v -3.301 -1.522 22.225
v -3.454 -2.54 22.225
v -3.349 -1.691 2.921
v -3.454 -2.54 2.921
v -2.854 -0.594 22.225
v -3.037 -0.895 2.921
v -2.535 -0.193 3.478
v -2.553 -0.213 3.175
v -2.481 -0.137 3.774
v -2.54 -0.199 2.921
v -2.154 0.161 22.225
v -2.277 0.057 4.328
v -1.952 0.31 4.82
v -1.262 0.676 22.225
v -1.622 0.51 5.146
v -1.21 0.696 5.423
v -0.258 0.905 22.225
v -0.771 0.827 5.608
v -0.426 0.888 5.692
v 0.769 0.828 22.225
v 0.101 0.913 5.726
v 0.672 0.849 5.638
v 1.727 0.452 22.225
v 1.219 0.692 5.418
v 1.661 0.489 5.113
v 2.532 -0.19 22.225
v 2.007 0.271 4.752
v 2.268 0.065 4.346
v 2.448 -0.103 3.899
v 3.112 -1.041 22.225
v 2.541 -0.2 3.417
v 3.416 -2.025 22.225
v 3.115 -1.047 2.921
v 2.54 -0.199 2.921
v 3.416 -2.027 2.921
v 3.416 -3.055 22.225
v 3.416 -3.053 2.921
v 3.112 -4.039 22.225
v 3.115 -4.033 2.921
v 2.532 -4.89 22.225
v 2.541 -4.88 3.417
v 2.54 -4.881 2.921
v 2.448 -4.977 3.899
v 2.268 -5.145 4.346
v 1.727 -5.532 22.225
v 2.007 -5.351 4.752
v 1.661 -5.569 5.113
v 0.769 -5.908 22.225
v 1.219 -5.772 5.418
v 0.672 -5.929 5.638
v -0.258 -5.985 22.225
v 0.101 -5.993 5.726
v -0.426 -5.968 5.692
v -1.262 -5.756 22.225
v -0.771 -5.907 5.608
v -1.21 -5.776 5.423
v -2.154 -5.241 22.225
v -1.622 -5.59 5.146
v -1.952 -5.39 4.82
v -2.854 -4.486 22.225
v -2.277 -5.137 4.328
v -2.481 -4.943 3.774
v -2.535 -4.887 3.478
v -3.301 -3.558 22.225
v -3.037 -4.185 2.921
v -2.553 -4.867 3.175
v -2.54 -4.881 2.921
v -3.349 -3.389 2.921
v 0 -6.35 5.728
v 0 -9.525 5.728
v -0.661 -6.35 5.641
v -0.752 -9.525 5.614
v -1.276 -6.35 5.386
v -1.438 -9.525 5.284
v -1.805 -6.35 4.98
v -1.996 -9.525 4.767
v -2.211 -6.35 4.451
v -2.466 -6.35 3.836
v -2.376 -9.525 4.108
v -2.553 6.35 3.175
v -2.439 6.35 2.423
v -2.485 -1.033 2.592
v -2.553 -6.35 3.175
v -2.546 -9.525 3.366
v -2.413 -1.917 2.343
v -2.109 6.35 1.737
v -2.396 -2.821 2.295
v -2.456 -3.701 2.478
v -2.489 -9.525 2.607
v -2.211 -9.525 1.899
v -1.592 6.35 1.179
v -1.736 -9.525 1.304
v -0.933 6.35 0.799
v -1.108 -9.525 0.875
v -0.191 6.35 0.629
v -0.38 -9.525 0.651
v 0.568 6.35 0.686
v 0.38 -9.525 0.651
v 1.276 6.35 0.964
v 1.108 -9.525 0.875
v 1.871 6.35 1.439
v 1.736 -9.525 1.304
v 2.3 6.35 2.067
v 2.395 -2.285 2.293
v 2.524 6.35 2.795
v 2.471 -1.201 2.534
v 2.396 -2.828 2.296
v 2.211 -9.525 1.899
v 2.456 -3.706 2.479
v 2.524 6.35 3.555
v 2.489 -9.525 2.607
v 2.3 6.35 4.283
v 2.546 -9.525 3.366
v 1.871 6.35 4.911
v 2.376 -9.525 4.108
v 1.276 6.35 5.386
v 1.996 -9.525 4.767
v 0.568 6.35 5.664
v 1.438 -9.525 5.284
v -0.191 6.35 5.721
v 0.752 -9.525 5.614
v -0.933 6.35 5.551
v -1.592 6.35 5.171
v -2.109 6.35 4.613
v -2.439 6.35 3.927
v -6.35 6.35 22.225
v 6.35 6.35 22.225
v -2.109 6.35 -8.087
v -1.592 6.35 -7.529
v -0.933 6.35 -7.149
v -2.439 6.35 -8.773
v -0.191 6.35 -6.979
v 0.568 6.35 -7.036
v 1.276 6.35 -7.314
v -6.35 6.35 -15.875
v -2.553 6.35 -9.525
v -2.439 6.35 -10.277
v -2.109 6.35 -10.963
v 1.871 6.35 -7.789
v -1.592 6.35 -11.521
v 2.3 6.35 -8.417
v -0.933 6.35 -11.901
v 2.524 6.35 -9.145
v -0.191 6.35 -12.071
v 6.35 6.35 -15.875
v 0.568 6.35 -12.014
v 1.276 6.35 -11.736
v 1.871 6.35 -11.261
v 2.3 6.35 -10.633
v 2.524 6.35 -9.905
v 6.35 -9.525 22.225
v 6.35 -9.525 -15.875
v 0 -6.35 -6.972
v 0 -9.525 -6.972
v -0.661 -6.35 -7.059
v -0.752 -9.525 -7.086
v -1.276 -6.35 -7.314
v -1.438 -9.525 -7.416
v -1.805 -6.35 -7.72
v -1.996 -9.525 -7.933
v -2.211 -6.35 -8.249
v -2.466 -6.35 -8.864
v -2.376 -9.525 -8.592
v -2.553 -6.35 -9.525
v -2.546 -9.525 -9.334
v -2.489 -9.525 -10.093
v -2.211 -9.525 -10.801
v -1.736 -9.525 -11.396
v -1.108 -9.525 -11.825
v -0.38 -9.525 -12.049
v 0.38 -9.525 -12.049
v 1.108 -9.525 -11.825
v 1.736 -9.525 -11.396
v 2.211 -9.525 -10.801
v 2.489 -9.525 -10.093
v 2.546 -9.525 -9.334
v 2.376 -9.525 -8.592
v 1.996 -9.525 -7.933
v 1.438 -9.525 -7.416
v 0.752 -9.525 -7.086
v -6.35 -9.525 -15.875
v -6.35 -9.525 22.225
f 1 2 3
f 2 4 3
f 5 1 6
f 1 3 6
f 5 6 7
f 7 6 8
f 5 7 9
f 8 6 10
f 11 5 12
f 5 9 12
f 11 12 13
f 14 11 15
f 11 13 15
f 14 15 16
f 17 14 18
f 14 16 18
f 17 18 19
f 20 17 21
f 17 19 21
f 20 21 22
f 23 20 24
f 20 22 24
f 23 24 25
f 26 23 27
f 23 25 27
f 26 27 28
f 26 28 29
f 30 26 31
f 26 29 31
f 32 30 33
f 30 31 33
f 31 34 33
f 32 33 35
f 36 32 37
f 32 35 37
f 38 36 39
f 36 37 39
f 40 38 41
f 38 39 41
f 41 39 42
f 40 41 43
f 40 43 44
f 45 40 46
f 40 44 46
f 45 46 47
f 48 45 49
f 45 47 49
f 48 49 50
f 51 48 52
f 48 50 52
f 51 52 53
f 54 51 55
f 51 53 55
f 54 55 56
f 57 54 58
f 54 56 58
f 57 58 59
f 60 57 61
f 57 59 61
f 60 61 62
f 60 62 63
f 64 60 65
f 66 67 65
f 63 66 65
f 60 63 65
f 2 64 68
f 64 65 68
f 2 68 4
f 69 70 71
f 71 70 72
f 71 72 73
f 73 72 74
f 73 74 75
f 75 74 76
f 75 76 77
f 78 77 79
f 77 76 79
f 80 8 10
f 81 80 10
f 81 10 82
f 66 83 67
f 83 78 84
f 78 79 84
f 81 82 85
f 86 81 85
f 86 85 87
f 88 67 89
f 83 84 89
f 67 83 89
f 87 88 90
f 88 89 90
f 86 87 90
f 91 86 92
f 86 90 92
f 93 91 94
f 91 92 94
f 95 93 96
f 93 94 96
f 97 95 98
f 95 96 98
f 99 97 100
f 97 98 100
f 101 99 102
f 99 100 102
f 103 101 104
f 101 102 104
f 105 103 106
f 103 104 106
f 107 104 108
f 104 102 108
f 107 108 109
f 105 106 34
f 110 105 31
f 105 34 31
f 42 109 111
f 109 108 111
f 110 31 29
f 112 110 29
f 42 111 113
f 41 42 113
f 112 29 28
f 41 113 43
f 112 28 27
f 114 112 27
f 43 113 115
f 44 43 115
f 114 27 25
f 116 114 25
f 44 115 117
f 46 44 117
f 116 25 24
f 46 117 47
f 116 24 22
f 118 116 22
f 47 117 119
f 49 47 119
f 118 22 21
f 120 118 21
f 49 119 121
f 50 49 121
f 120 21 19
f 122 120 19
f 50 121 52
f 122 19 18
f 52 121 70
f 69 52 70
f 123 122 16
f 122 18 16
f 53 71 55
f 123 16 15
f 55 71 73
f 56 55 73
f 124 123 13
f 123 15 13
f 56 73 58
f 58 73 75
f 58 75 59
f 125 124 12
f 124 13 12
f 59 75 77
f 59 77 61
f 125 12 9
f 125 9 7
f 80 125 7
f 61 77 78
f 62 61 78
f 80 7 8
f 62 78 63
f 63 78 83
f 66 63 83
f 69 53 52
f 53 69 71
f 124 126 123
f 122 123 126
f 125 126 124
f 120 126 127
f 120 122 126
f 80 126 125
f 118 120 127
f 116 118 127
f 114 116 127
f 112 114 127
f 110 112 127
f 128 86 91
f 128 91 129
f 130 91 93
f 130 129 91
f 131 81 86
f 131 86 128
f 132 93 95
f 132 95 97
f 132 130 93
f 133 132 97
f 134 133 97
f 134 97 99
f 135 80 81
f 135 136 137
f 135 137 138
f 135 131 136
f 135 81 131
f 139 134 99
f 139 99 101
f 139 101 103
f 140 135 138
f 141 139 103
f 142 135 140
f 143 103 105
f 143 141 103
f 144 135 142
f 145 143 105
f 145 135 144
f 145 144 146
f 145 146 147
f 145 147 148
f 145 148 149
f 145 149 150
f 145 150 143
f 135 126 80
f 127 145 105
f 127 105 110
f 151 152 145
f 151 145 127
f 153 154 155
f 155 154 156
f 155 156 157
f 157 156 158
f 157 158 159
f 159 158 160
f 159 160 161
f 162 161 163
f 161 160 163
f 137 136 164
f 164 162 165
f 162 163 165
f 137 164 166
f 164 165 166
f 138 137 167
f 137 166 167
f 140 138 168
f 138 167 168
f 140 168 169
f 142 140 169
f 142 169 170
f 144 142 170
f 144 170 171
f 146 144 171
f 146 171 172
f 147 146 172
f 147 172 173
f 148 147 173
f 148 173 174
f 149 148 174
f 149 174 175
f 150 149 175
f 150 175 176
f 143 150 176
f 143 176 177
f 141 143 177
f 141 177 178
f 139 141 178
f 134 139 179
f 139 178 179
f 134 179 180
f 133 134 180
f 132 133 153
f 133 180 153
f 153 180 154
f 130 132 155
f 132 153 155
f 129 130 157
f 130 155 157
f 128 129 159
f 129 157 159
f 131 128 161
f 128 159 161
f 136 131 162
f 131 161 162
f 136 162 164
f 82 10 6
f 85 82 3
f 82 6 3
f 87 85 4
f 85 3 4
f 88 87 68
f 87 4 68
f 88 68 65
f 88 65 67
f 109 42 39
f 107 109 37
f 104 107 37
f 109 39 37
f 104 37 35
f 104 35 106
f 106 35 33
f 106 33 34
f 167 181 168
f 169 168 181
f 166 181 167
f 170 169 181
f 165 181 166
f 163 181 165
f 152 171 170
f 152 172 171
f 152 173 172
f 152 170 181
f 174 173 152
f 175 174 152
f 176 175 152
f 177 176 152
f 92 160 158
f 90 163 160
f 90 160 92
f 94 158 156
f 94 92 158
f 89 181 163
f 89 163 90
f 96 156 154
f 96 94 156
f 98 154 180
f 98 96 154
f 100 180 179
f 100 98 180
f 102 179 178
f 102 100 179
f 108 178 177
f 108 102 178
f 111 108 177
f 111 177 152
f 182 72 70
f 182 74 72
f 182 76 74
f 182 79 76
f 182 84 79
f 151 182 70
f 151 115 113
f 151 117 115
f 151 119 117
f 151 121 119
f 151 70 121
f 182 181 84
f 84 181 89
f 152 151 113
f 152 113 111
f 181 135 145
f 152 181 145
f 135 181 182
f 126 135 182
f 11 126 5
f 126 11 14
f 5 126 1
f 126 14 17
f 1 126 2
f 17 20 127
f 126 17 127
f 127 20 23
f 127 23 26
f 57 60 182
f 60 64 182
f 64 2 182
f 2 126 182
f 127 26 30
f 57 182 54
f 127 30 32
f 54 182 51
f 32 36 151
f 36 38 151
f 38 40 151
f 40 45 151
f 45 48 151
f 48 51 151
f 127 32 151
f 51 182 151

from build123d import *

# Parameters (mm, degrees)
SKETCH1_W                    = 12.7
SKETCH1_H                    = 12.7
BOSS_EXTRUDE1_DEPTH          = 15.875
F_7_0_201_DIAMETER_HOLE1_D   = 5.1054
SKETCH5_W                    = 12.7
SKETCH5_H                    = 12.7
BOSS_EXTRUDE2_DEPTH          = 6.35
F_5_16_24_TAPPED_HOLE1_D     = 6.9088
F_5_16_24_TAPPED_HOLE1_DEPTH = 19.304
F_5_16_24_TAPPED_HOLE1_TIP   = 2.075612922
BOSS_EXTRUDE4_START          = 3.175
SKETCH9_W                    = 12.7
SKETCH9_H                    = 38.1
SKETCH9_R                    = 2.5527
BOSS_EXTRUDE4_DEPTH          = 3.175


with BuildPart() as part:
    # Sketch1 → Boss-Extrude1 (new, symmetric)
    with BuildSketch(Plane.XY):
        Rectangle(SKETCH1_W, SKETCH1_H)
    extrude(amount=BOSS_EXTRUDE1_DEPTH, both=True)

    # #7 (0.201) Diameter Hole1 (through all)
    with Locations(Plane(origin=(0, 6.35, 0), x_dir=(1, 0, 0), z_dir=(0, 1, 0))):
        with Locations((0, -3.175), (0, 9.525)):
            Hole(F_7_0_201_DIAMETER_HOLE1_D / 2)

    # Sketch5 → Boss-Extrude2 (add)
    with BuildSketch(Plane.XY.offset(15.875)):
        Rectangle(SKETCH5_W, SKETCH5_H)
    extrude(amount=BOSS_EXTRUDE2_DEPTH)

    # 5/16-24 Tapped Hole1
    with Locations(Plane.XY.offset(22.225)):
        with Locations((0, -2.54)):
            Hole(F_5_16_24_TAPPED_HOLE1_D / 2, depth=F_5_16_24_TAPPED_HOLE1_DEPTH)
            with Locations((0, 0, -(F_5_16_24_TAPPED_HOLE1_DEPTH + F_5_16_24_TAPPED_HOLE1_TIP / 2))):  # 118° drill point
                Cone(0, F_5_16_24_TAPPED_HOLE1_D / 2, F_5_16_24_TAPPED_HOLE1_TIP, mode=Mode.SUBTRACT)

    # Sketch9 → Boss-Extrude4 (add)
    with BuildSketch(Plane.XZ.offset(6.35).offset(BOSS_EXTRUDE4_START)):
        with Locations((0, 3.175)):
            Rectangle(SKETCH9_W, SKETCH9_H)
        with Locations(Location((0, 3.175, 0), (0, 0, 90))):
            Circle(SKETCH9_R, mode=Mode.SUBTRACT)
        with Locations(Location((0, -9.525, 0), (0, 0, 90))):
            Circle(SKETCH9_R, mode=Mode.SUBTRACT)
    extrude(amount=-BOSS_EXTRUDE4_DEPTH)


solid = part.part
